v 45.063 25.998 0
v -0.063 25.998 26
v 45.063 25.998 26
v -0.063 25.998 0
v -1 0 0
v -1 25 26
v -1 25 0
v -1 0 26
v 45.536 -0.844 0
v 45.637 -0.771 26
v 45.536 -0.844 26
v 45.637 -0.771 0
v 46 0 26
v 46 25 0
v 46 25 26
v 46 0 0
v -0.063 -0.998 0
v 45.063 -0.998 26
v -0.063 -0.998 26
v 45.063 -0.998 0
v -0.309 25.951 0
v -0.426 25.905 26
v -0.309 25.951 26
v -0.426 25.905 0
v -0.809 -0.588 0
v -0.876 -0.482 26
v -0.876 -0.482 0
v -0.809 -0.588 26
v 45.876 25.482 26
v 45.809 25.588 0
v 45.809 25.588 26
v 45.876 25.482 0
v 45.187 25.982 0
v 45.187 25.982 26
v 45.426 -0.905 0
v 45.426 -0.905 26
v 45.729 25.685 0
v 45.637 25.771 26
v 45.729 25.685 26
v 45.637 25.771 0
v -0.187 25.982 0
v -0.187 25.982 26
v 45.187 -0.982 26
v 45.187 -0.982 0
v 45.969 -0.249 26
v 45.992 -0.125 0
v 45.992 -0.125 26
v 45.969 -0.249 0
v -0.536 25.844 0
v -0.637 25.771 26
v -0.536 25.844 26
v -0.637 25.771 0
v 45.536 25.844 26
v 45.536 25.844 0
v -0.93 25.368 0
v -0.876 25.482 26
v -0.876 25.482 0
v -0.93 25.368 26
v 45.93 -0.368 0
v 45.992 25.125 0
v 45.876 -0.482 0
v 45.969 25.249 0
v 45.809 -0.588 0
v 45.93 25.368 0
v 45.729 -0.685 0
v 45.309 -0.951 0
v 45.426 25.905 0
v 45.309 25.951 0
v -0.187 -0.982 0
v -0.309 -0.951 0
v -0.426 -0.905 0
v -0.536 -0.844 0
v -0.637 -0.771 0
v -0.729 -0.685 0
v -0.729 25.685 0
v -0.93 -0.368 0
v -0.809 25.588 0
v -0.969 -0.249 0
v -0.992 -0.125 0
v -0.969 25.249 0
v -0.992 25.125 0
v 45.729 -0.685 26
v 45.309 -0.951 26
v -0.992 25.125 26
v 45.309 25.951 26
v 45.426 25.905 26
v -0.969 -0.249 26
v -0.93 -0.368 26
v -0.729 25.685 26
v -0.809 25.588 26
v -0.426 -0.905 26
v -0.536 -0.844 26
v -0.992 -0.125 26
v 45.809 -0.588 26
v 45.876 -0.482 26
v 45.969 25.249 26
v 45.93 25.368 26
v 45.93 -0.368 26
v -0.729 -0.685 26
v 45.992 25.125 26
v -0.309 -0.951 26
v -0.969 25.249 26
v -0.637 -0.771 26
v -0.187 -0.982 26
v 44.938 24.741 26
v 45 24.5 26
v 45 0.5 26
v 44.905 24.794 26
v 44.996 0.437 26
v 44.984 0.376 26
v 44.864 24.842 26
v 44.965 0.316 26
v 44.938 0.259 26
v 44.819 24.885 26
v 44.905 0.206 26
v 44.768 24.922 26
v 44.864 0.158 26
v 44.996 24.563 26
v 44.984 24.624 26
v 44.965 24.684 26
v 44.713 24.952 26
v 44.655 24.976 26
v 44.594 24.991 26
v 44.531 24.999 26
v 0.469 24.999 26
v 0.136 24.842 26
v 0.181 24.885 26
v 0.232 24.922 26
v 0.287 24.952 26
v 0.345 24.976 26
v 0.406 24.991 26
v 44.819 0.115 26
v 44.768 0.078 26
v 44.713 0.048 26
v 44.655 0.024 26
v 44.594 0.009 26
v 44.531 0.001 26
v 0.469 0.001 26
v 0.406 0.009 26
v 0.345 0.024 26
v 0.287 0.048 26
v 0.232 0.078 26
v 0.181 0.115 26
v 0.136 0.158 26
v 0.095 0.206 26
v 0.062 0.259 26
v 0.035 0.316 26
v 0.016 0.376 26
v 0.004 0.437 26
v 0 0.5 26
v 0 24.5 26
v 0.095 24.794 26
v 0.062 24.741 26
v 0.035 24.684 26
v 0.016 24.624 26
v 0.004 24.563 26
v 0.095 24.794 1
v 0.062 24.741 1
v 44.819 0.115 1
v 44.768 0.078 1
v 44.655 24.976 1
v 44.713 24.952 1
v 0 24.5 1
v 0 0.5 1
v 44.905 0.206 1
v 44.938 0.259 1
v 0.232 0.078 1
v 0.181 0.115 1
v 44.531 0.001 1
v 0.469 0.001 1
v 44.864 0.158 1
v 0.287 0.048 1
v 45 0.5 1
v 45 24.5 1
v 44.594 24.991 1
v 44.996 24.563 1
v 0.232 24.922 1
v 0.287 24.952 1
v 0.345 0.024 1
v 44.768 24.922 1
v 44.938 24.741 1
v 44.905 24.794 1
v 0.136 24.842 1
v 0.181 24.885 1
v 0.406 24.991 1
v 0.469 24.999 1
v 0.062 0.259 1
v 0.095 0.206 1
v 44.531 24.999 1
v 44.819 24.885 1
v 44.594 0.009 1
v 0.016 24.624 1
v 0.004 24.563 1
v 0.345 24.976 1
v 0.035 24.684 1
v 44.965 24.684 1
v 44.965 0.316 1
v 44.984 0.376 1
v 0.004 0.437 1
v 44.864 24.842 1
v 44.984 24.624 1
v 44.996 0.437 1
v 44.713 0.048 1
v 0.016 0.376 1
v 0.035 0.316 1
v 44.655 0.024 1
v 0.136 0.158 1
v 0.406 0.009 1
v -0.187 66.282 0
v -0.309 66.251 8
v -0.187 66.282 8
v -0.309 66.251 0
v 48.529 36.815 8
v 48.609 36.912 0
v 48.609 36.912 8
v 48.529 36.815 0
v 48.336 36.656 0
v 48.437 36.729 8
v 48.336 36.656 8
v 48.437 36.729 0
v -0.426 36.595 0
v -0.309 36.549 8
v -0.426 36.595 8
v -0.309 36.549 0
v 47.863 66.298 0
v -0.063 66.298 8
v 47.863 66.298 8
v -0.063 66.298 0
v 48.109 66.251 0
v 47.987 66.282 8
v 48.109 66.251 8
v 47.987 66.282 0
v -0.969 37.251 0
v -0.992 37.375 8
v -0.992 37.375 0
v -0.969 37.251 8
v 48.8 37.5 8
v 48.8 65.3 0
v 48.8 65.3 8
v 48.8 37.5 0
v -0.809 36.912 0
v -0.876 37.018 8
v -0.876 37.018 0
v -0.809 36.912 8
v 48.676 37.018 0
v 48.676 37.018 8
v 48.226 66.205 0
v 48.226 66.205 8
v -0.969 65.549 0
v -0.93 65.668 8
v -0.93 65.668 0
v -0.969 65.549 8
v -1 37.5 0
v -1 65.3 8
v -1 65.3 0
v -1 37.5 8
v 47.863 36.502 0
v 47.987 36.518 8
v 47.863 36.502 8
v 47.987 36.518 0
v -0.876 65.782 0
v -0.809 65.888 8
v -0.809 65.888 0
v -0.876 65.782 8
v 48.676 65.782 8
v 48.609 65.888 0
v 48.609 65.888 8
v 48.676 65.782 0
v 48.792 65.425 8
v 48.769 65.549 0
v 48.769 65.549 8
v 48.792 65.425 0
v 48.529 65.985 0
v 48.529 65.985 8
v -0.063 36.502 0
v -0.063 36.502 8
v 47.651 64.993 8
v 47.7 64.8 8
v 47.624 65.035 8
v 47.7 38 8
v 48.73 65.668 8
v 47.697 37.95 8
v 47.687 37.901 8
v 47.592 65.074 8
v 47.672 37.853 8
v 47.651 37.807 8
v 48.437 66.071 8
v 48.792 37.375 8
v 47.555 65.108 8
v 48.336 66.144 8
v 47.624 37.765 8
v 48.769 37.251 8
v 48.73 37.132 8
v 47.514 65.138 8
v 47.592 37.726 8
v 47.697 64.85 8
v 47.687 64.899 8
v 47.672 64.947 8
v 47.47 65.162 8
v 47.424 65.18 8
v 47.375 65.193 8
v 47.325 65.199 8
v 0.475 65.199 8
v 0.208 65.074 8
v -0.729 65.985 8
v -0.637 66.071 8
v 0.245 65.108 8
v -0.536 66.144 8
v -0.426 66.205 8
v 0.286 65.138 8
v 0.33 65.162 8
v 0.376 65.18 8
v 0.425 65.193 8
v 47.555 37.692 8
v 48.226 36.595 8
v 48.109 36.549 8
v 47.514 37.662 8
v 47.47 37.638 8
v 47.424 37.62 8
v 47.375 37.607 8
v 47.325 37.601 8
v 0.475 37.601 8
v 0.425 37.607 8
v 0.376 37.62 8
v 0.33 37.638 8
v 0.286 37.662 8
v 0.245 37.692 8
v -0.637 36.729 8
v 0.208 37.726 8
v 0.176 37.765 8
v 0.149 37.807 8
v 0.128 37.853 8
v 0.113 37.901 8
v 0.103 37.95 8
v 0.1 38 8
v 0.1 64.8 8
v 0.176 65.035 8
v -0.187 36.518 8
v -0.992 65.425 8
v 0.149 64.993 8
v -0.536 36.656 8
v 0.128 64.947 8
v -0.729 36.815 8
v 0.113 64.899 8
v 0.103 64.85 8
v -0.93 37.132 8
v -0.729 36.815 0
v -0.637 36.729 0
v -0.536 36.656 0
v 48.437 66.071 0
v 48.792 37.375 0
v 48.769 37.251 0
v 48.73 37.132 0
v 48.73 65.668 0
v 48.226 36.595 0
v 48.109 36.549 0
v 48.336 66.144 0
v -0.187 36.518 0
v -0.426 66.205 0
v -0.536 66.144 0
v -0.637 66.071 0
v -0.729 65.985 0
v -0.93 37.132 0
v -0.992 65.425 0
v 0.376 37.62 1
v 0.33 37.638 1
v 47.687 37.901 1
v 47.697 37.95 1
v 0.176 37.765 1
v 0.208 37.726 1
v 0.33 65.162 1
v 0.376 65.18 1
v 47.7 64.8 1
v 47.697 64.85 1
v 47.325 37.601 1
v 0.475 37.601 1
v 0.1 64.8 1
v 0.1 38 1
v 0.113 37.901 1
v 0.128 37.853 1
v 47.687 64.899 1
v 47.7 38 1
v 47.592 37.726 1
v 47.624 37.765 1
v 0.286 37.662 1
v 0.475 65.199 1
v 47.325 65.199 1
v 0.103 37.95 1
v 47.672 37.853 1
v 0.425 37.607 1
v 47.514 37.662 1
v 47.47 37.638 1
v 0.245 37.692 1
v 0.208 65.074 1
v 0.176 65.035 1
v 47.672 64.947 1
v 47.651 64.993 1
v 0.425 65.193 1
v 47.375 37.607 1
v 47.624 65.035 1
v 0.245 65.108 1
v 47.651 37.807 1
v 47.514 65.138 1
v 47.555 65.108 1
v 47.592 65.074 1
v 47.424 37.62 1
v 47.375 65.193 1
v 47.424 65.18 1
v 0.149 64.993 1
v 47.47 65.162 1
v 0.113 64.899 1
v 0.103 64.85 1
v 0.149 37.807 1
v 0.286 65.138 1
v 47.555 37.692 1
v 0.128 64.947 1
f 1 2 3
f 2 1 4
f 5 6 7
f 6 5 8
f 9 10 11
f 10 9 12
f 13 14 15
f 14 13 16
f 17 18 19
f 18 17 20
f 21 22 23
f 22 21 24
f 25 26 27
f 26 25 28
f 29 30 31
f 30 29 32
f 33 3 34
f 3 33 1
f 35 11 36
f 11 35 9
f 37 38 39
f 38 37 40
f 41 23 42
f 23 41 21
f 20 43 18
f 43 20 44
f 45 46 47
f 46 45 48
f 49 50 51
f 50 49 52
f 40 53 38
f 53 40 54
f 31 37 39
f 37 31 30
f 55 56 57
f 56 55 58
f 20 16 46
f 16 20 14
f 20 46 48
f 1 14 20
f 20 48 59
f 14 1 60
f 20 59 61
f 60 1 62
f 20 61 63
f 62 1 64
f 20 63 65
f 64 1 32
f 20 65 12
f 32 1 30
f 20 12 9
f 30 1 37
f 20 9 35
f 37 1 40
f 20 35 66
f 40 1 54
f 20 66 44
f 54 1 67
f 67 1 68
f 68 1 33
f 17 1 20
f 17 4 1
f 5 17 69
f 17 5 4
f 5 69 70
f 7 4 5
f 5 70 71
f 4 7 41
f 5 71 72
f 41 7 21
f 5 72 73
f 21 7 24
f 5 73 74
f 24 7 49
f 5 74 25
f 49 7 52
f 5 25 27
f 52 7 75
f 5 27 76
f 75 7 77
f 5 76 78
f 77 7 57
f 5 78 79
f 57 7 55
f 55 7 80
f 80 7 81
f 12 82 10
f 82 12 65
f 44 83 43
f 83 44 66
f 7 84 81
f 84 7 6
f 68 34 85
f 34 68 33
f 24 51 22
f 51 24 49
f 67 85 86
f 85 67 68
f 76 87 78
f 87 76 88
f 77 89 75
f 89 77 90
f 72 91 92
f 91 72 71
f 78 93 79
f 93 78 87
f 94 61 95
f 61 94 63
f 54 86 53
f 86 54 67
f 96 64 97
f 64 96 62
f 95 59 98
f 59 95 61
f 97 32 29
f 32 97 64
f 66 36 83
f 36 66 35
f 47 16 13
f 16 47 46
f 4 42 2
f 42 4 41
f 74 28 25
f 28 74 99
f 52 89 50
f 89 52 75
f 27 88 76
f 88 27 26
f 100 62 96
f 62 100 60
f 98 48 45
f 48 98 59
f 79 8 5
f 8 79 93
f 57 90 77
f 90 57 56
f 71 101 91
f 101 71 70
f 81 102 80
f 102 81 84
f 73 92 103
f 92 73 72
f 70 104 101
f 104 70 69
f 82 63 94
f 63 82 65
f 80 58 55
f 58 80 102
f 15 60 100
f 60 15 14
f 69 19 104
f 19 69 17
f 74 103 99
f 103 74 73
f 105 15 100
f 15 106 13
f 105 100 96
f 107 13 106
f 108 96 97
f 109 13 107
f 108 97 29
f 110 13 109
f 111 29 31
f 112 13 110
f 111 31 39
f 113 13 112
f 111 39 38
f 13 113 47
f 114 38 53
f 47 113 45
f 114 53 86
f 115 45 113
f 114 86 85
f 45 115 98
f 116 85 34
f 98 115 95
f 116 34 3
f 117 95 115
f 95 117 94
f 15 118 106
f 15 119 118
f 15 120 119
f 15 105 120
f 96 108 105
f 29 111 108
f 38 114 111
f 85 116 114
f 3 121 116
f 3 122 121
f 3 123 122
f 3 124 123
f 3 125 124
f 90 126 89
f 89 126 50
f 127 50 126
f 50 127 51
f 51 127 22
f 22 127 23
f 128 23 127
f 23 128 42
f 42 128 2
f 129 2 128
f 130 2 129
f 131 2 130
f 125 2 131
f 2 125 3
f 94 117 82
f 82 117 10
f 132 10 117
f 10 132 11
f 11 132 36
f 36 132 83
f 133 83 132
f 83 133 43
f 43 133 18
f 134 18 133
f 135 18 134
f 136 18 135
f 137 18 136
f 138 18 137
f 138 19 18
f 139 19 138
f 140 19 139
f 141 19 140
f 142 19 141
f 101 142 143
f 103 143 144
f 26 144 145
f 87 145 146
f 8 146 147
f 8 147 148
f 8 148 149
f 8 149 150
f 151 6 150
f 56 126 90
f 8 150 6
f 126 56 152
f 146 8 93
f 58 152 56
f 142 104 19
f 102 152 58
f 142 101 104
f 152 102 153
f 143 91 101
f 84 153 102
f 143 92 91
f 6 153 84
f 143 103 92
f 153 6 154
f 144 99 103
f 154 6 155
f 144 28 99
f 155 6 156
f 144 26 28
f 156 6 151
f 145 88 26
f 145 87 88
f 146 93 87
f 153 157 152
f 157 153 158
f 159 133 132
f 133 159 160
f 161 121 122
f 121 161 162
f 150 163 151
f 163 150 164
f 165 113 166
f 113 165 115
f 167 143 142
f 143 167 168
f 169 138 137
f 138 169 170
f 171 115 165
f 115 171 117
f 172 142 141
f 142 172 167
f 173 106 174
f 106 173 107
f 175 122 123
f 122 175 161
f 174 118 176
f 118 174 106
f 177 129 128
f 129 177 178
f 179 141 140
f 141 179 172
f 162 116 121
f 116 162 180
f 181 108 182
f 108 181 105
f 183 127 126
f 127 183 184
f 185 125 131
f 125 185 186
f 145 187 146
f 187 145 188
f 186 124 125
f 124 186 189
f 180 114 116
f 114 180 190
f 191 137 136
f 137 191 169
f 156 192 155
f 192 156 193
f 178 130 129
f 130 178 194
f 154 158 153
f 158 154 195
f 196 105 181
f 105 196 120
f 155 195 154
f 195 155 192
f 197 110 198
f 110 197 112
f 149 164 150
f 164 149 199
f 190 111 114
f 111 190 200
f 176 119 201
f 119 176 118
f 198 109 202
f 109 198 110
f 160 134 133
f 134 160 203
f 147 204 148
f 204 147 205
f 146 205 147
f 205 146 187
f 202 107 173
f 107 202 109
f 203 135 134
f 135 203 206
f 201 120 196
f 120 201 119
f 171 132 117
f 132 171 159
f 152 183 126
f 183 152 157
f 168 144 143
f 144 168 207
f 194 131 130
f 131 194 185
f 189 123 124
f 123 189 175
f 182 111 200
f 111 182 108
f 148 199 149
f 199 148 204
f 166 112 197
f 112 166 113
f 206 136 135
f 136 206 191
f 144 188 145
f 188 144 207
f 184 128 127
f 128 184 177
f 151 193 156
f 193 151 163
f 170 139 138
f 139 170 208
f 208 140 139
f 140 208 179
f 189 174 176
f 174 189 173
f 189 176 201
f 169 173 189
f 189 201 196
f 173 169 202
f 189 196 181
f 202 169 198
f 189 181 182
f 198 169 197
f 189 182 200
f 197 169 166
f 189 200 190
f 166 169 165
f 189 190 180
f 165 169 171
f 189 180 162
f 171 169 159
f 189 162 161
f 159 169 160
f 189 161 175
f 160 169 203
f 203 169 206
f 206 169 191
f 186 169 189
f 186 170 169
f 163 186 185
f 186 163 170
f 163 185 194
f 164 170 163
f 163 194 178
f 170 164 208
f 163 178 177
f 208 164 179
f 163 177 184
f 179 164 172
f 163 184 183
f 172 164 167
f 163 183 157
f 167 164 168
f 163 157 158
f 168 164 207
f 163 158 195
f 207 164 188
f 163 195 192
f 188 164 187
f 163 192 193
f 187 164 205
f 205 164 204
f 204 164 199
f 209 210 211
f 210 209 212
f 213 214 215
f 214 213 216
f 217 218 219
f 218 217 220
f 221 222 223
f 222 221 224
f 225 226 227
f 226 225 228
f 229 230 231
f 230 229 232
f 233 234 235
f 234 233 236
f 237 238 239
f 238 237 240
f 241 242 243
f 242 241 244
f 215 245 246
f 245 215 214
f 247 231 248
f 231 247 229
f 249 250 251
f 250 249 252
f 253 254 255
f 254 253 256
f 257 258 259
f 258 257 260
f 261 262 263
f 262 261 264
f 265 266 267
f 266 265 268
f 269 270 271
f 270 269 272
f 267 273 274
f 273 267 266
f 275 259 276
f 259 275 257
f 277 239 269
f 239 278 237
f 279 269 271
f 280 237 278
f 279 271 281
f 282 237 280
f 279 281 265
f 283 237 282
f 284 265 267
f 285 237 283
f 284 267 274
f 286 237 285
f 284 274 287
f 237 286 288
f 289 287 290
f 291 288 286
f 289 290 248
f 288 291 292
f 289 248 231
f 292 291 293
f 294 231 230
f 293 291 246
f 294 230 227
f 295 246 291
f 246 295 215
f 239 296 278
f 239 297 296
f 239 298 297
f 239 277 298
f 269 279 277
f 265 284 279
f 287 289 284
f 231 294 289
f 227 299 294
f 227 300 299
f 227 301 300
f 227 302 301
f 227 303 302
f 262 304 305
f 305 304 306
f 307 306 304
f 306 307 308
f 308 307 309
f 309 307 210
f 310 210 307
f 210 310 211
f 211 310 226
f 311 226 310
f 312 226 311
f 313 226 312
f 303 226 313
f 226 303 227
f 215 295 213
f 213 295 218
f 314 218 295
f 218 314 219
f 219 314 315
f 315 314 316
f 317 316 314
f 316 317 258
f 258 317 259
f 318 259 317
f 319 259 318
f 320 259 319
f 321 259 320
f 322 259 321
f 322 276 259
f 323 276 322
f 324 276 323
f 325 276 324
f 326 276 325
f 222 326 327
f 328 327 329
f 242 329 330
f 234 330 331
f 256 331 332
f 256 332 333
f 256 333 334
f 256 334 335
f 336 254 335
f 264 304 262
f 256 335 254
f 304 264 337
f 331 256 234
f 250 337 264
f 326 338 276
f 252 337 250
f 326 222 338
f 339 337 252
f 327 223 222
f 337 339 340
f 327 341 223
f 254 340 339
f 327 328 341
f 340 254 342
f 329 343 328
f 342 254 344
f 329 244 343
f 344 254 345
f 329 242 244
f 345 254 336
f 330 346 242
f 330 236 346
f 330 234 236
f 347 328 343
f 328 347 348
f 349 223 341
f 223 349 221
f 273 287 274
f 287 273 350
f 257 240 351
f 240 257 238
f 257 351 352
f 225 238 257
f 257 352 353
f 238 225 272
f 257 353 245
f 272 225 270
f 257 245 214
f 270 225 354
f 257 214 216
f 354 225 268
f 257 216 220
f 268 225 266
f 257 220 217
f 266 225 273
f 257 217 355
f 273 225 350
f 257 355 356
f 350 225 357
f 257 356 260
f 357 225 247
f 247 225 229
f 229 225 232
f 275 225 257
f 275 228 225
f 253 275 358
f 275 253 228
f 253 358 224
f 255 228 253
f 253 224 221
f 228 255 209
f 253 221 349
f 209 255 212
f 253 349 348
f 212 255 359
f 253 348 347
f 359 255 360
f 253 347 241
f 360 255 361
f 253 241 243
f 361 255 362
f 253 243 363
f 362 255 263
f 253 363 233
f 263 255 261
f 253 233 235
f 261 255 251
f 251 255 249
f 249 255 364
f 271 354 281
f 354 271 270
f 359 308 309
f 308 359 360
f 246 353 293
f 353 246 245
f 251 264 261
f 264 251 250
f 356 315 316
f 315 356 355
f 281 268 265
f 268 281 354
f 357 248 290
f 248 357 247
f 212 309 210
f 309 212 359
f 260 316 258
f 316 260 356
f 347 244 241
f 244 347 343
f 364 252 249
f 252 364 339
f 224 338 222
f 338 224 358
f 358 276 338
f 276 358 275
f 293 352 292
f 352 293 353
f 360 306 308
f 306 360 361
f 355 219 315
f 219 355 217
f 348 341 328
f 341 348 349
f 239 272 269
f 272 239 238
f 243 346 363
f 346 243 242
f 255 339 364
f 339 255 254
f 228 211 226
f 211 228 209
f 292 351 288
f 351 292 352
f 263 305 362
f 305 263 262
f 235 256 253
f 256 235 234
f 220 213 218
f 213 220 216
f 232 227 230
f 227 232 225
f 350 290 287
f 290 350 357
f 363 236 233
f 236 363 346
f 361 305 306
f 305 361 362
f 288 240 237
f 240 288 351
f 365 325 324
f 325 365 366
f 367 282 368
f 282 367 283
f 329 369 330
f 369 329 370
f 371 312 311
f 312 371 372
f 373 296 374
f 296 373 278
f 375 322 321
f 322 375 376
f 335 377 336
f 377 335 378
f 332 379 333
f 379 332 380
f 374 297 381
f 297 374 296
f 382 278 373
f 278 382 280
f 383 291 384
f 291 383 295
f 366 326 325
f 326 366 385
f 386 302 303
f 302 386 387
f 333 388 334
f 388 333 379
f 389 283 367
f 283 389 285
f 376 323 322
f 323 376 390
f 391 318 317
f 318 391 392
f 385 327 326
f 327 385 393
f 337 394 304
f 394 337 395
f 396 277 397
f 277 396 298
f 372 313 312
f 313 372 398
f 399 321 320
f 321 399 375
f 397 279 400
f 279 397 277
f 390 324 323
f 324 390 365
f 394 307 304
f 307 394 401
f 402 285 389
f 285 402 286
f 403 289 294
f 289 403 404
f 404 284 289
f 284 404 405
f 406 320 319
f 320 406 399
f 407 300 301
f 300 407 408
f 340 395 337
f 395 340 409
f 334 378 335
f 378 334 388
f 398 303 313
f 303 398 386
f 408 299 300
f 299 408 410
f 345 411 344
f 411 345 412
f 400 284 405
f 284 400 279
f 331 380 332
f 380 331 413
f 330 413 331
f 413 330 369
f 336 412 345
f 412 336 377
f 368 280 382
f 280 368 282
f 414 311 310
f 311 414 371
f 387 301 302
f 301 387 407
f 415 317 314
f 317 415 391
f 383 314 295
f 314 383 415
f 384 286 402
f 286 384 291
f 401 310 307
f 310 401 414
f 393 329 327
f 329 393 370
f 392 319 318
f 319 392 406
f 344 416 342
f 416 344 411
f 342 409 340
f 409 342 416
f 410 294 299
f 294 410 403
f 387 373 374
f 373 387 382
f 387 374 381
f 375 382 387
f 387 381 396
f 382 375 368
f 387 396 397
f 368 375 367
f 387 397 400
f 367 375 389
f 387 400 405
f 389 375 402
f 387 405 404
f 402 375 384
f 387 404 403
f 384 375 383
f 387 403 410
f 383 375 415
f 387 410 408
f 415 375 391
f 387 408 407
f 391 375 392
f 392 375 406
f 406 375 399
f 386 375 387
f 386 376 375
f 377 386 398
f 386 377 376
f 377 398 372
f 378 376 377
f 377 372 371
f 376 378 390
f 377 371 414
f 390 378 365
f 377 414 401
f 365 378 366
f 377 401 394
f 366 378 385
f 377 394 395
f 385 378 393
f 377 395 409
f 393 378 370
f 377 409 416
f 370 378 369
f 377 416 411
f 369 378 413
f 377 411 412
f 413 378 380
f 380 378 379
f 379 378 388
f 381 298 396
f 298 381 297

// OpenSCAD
/* [ Mini Rounded Box v.1 ]
written by: Hermes Alvarado <hermesalvarado@gmail.com
*/
//Define dimensions:
$fn=50; //resolution
thickness = 1;
bottomthickness = 1;
tolerance = 0.4;
width = 45;
length = 25;
height = 25;
lidheight = 7;

//Make box:
difference(){
    minkowski(){
        cube([width,length,height]);
        cylinder(r=1,h=1);
        }
        translate([thickness/2,thickness/2,bottomthickness]){
            minkowski(){
                cube([width-thickness,length-thickness,height]);
                cylinder(r=1-thickness/2,h=1);
            }
        }
    }
//Make lid:
    translate([0,length*1.5,0]){    
    difference(){
        minkowski(){
            cube([width+thickness*2+tolerance*2,length+thickness*2+tolerance*2,lidheight]);
            cylinder(r=1,h=1);
        }
        translate([thickness/2,thickness/2,bottomthickness]){
            minkowski(){
                cube([width+tolerance*2+thickness,length+tolerance*2+thickness,lidheight]);
                cylinder(r=1+tolerance-thickness,h=1);
            }
        }
    }
}
